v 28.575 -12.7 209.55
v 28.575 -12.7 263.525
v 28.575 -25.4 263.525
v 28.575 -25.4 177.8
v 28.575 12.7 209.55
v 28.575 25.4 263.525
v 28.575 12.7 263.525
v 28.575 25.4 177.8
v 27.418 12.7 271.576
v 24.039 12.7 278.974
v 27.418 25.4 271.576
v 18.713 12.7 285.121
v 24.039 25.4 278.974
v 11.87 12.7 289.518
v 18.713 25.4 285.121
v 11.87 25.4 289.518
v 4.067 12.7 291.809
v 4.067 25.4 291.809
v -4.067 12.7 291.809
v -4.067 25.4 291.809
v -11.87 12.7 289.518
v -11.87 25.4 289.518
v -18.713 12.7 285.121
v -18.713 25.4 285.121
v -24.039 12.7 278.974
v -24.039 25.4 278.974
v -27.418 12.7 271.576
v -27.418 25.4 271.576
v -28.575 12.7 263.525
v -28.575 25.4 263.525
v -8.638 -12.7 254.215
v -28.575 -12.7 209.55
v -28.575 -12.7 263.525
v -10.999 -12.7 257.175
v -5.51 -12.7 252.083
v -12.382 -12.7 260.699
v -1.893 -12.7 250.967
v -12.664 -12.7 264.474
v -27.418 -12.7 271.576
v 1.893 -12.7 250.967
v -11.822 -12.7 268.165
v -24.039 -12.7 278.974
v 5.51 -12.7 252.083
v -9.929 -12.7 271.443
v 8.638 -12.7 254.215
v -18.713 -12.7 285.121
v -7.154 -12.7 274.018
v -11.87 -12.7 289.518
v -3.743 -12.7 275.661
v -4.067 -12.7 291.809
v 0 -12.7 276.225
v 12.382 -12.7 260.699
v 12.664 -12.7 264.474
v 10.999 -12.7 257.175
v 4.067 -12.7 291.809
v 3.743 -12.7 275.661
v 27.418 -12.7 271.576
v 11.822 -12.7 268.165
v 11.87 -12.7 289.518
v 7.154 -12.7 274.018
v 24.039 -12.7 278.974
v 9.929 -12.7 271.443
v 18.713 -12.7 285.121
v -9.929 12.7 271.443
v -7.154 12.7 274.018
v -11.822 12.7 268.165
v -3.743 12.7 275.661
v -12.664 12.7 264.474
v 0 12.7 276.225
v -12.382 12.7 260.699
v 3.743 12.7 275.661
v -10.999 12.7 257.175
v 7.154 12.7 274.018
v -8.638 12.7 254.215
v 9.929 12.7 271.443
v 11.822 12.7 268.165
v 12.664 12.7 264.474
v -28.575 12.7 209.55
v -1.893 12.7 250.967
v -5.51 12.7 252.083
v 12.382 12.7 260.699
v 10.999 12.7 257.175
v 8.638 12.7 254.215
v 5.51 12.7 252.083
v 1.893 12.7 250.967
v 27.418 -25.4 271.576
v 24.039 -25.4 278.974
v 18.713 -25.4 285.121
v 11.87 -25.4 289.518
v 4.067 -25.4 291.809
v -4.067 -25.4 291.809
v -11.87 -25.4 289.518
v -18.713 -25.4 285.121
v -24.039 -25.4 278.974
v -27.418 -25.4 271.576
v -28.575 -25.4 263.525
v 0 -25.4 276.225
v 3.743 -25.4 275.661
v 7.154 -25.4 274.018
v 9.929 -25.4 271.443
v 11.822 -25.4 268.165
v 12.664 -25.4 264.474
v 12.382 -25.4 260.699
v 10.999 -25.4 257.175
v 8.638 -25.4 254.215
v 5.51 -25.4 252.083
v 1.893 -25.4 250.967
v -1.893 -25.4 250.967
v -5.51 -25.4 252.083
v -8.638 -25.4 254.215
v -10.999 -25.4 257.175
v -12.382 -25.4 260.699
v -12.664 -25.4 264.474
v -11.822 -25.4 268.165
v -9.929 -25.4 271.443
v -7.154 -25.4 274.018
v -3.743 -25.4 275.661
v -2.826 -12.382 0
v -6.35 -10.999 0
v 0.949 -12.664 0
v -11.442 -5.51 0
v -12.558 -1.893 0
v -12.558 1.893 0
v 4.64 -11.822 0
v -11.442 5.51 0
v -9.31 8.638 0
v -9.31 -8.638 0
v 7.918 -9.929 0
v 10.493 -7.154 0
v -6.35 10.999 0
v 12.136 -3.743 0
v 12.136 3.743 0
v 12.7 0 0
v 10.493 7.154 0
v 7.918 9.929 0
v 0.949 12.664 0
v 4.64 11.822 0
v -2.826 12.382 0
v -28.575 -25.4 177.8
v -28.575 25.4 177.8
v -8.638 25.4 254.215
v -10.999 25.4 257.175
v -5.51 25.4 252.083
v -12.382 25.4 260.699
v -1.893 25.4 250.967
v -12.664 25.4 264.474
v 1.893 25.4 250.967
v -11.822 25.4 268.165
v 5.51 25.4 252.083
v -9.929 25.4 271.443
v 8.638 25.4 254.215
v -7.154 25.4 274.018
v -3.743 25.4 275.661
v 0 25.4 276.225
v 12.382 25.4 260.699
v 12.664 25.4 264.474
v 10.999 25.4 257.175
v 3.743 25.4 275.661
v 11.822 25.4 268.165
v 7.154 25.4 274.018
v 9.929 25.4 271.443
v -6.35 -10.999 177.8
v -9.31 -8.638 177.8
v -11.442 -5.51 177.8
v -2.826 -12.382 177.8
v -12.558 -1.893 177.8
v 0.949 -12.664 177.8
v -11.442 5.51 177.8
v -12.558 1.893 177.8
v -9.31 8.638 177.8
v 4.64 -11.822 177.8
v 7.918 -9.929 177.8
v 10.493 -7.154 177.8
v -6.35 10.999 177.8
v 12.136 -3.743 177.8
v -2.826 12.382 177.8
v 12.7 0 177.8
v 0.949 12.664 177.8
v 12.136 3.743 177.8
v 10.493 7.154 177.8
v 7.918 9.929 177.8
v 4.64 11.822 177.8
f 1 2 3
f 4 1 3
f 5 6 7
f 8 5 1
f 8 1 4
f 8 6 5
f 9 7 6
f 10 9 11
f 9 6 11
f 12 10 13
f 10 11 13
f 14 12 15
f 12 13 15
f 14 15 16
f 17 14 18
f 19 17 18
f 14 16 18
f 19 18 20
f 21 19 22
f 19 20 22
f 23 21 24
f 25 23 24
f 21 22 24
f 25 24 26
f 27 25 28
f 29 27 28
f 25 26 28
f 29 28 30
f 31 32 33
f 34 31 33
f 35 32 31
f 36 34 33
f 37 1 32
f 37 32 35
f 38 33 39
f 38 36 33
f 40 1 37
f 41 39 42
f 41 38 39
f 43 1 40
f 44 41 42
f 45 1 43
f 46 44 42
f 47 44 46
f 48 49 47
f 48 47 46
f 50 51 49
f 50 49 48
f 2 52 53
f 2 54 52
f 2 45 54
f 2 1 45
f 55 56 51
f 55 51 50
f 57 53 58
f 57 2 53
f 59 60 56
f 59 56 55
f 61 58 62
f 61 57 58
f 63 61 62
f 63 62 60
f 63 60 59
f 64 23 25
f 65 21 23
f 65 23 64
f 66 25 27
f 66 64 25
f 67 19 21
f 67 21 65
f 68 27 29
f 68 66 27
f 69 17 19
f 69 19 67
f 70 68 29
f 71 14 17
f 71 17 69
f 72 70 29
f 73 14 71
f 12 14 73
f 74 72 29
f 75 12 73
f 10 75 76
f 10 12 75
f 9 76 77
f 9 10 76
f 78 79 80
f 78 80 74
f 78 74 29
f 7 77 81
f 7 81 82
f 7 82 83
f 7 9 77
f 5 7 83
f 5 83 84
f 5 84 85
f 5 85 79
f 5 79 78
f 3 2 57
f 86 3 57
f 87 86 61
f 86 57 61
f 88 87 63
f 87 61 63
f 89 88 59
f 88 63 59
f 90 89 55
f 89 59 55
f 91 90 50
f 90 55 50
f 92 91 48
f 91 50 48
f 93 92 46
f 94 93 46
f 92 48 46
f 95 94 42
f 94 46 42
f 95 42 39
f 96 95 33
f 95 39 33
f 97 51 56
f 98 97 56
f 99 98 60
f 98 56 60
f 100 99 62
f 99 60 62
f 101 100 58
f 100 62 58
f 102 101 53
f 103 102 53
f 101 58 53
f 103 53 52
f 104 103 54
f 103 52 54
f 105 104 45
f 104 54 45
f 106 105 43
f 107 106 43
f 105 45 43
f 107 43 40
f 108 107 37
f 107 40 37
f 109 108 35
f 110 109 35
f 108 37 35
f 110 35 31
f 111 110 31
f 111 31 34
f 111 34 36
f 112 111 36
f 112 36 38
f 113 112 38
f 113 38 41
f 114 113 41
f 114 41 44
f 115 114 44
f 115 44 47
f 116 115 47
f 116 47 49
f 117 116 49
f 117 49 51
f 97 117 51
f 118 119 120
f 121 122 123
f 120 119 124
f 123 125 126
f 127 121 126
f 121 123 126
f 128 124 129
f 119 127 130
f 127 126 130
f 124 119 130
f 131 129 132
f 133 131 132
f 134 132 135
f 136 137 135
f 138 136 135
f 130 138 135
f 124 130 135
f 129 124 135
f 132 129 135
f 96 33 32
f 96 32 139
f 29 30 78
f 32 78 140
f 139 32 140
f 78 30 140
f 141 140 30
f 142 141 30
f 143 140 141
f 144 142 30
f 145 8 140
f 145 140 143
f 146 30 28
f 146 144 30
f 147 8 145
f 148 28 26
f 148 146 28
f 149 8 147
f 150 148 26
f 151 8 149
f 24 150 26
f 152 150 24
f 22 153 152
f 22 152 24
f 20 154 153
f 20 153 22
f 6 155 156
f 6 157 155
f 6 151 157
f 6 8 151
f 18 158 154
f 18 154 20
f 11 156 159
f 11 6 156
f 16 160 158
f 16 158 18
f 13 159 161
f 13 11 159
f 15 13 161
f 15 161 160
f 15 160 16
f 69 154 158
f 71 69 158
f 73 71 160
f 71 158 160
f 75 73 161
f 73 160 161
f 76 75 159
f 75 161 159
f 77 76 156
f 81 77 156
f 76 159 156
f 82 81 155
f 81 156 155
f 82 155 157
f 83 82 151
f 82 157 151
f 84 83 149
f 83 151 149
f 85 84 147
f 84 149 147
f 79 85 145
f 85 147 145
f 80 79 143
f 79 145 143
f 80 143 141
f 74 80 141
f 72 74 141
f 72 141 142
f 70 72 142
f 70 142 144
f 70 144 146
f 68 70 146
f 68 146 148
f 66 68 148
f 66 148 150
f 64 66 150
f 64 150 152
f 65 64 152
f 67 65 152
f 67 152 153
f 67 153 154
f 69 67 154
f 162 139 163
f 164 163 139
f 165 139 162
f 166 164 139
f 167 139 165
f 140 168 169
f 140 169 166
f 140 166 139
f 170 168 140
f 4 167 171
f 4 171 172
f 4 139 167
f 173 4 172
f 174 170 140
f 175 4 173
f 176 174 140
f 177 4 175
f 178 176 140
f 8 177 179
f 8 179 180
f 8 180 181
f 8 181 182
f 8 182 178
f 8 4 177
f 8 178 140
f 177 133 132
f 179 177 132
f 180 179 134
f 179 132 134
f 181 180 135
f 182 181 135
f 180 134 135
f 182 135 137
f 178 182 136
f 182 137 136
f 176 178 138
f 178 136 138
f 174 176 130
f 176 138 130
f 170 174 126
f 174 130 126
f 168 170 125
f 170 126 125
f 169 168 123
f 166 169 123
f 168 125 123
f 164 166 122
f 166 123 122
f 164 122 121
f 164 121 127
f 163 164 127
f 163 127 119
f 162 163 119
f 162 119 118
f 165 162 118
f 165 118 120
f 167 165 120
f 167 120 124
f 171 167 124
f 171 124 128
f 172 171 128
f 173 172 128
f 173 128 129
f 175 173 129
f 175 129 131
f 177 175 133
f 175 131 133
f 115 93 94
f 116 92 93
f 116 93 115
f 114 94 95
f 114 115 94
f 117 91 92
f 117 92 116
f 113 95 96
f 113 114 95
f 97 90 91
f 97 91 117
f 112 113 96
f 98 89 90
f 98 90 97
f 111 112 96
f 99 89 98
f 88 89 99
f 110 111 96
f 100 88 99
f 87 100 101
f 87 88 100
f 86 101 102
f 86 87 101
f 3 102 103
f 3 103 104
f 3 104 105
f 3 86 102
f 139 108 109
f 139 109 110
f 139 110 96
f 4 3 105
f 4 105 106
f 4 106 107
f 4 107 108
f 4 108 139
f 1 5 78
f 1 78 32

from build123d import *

# Parameters (mm, degrees)
SKETCH1_R          = 12.7
EXTRUDE1_DEPTH     = 177.8
EXTRUDE2_DEPTH     = 28.575
SKETCH3_R          = 12.7
CUT_EXTRUDE1_DEPTH = 298.858323075


with BuildPart() as part:
    # Sketch1 → Extrude1 (new body)
    with BuildSketch(Plane.XY):
        Circle(SKETCH1_R)
    extrude(amount=EXTRUDE1_DEPTH)

    # Sketch2 → Extrude2 (add, symmetric)
    with BuildSketch(Plane(origin=(0, 0, 0), x_dir=(0, 0, -1), z_dir=(1, 0, 0))):
        Polygon((-177.8, -25.4), (-177.8, 25.4), (-292.1, 25.4), (-292.1, 12.7), (-209.55, 12.7), (-209.55, -12.7), (-292.1, -12.7), (-292.1, -25.4), align=None)
    extrude(amount=EXTRUDE2_DEPTH, both=True)

    # Sketch3 → Cut-Extrude1 (cut, through all)
    with BuildSketch(Plane(origin=(0, 25.4, 0), x_dir=(-1, 0, 0), z_dir=(0, 1, 0))):
        with Locations(Location((0, 263.525, 0), (0, 0, 90))):
            Circle(SKETCH3_R)
        with BuildLine():
            Line((28.575, 263.525), (28.575, 314.325))
            Line((28.575, 314.325), (-28.575, 314.325))
            Line((-28.575, 314.325), (-28.575, 263.525))
            ThreePointArc((-28.575, 263.525), (0, 292.1), (28.575, 263.525))
        make_face()
    extrude(amount=-CUT_EXTRUDE1_DEPTH, mode=Mode.SUBTRACT)


solid = part.part
